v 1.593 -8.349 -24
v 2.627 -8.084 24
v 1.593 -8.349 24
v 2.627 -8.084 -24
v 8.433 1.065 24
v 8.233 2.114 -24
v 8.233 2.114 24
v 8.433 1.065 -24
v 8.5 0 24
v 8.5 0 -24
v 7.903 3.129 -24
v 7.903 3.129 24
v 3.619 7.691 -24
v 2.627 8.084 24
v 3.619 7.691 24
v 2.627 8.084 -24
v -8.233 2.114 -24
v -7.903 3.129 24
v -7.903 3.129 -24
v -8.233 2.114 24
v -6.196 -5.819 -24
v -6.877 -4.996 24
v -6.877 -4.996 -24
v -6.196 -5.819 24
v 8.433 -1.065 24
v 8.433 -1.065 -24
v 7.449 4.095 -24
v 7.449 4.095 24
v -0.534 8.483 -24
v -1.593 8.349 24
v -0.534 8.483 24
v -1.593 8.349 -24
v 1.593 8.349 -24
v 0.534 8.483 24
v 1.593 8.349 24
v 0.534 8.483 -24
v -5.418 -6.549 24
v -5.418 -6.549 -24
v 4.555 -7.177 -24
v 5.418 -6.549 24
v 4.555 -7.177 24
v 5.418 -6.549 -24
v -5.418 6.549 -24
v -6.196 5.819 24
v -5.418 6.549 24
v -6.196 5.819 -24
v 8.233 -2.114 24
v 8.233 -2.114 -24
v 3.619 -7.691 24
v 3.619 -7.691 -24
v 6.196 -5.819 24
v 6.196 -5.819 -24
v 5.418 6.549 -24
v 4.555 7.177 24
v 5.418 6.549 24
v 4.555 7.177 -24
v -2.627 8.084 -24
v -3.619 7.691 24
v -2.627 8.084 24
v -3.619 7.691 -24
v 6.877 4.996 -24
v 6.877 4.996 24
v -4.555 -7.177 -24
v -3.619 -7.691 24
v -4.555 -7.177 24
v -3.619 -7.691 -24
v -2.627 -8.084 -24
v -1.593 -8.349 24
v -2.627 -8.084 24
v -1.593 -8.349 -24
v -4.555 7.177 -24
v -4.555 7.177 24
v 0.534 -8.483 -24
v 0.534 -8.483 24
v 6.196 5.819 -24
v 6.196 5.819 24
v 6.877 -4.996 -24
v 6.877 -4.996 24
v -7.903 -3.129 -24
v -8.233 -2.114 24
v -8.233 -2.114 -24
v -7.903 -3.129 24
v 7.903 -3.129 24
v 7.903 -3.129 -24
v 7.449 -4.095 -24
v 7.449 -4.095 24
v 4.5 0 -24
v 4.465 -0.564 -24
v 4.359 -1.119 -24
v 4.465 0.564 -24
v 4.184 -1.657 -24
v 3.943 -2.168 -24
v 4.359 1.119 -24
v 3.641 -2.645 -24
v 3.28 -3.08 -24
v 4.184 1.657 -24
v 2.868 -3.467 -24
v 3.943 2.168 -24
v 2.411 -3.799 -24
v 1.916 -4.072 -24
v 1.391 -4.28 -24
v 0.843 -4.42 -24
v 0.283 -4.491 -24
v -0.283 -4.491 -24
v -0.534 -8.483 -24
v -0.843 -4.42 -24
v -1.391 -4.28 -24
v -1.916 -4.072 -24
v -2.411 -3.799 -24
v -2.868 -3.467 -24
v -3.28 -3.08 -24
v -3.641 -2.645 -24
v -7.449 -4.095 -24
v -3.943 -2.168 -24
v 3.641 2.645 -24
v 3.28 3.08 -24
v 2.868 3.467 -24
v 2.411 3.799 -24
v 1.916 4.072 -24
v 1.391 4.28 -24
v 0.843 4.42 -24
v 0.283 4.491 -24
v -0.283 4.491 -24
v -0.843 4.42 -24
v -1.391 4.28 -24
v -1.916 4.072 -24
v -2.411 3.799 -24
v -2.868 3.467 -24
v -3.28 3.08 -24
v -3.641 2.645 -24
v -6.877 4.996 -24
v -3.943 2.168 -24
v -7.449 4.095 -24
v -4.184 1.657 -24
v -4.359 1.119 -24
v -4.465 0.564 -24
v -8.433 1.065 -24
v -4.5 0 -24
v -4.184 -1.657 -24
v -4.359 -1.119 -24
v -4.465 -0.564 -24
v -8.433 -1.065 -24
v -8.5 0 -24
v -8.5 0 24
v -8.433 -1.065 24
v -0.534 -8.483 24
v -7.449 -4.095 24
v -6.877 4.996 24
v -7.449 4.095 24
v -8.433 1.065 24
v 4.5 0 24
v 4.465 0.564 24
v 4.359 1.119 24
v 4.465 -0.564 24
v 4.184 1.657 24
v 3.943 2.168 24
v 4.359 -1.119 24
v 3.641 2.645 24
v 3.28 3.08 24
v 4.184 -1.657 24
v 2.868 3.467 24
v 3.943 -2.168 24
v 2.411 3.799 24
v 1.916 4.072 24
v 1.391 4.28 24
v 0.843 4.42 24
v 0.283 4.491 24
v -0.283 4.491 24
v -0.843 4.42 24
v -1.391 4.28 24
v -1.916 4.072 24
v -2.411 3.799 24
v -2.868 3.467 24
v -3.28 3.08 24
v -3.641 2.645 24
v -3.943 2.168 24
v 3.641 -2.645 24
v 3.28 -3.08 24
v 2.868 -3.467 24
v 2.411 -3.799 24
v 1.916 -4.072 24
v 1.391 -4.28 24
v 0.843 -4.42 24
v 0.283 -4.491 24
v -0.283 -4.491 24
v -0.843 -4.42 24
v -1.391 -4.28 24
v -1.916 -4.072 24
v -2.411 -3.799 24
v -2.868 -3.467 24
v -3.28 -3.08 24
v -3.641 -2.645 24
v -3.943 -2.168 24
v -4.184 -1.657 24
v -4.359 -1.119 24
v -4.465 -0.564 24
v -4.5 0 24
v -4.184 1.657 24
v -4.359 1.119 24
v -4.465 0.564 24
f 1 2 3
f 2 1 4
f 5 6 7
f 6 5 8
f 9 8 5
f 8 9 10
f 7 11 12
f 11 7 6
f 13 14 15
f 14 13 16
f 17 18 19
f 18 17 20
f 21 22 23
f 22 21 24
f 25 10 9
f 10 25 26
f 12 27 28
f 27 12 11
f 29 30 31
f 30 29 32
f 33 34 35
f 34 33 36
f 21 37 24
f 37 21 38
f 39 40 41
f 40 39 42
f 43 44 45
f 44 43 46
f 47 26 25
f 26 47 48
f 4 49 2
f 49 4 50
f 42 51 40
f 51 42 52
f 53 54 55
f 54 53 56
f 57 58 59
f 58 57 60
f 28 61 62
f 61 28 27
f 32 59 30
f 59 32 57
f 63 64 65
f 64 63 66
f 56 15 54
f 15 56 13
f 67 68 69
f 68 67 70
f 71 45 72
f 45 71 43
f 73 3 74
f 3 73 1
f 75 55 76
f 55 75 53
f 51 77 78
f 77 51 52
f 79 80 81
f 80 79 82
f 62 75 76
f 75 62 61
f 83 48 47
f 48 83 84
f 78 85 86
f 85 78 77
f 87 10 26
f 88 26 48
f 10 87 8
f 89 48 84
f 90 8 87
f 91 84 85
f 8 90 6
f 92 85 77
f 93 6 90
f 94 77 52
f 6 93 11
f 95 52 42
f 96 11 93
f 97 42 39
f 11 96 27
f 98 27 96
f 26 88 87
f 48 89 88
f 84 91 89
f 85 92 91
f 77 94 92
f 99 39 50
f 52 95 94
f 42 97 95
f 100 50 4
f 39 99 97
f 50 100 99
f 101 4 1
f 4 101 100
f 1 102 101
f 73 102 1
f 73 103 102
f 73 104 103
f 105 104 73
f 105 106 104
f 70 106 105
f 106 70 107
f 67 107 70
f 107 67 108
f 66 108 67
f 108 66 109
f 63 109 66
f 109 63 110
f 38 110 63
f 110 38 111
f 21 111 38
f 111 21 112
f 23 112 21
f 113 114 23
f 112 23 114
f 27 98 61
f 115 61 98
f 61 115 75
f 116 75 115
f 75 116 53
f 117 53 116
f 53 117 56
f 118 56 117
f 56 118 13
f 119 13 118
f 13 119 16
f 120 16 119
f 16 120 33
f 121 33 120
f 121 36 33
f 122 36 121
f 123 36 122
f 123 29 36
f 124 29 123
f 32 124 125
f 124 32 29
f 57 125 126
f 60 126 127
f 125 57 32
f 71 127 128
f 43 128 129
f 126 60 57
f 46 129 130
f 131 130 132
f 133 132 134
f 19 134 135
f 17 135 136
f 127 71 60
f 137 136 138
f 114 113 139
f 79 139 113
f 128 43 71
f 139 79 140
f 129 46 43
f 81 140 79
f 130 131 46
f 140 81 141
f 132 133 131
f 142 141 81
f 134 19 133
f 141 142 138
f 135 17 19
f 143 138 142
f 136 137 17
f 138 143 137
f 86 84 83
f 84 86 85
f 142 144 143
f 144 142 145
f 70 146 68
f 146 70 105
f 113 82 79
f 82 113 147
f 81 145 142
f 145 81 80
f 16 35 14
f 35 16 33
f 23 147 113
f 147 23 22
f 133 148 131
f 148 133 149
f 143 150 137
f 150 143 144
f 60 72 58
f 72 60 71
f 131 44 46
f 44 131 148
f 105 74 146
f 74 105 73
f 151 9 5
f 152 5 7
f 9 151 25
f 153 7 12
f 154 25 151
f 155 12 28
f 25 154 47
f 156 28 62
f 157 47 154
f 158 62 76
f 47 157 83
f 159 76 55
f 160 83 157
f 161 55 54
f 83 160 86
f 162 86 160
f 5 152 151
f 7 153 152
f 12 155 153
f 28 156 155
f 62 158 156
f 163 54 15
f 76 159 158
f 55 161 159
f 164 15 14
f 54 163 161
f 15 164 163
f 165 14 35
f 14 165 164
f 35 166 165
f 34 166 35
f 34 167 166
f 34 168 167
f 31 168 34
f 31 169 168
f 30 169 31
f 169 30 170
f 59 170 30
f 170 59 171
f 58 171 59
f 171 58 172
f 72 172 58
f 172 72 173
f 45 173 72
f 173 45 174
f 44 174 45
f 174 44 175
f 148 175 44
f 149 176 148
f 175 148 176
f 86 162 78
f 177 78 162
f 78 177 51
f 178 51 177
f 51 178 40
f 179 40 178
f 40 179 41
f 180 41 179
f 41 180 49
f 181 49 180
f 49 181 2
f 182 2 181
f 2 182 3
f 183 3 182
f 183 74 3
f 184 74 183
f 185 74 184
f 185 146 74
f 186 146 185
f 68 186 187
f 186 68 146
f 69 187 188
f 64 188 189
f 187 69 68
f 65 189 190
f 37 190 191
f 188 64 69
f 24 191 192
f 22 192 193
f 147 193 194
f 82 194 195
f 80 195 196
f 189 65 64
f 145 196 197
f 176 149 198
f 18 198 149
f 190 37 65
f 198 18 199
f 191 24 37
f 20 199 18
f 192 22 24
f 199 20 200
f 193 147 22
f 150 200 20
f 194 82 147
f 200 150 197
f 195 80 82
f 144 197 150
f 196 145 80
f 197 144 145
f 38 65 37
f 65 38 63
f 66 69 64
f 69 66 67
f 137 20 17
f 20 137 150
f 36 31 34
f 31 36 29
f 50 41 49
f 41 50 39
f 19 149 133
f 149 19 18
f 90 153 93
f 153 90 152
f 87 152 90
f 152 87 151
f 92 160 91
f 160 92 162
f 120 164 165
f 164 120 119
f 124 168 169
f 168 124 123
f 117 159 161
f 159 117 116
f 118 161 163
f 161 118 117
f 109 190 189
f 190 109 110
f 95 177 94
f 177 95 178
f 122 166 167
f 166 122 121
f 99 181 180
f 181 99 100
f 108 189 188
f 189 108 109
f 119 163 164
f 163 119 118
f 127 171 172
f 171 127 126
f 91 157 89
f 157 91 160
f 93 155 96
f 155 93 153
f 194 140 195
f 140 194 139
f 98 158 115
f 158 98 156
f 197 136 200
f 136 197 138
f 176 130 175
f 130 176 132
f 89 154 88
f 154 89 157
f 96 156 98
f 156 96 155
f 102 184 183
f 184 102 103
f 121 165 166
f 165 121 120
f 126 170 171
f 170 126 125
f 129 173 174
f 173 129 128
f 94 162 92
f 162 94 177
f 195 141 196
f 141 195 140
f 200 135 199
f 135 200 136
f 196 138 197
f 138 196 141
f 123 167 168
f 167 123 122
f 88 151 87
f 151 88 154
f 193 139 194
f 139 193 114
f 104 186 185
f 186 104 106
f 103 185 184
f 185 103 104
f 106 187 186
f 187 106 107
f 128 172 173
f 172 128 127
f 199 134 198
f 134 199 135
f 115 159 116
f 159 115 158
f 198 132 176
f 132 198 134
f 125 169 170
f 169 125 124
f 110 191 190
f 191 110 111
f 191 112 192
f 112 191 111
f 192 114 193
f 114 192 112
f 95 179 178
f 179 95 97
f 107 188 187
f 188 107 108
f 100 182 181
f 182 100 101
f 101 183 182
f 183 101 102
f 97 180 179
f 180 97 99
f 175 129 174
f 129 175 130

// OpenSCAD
$fn = 50;


difference() {
	union() {
		translate(v = [0, 0, -24.0000000000]) {
			cylinder(h = 48, r = 8.5000000000);
		}
	}
	union() {
		translate(v = [0, 0, -100.0000000000]) {
			cylinder(h = 200, r = 4.5000000000);
		}
	}
}
